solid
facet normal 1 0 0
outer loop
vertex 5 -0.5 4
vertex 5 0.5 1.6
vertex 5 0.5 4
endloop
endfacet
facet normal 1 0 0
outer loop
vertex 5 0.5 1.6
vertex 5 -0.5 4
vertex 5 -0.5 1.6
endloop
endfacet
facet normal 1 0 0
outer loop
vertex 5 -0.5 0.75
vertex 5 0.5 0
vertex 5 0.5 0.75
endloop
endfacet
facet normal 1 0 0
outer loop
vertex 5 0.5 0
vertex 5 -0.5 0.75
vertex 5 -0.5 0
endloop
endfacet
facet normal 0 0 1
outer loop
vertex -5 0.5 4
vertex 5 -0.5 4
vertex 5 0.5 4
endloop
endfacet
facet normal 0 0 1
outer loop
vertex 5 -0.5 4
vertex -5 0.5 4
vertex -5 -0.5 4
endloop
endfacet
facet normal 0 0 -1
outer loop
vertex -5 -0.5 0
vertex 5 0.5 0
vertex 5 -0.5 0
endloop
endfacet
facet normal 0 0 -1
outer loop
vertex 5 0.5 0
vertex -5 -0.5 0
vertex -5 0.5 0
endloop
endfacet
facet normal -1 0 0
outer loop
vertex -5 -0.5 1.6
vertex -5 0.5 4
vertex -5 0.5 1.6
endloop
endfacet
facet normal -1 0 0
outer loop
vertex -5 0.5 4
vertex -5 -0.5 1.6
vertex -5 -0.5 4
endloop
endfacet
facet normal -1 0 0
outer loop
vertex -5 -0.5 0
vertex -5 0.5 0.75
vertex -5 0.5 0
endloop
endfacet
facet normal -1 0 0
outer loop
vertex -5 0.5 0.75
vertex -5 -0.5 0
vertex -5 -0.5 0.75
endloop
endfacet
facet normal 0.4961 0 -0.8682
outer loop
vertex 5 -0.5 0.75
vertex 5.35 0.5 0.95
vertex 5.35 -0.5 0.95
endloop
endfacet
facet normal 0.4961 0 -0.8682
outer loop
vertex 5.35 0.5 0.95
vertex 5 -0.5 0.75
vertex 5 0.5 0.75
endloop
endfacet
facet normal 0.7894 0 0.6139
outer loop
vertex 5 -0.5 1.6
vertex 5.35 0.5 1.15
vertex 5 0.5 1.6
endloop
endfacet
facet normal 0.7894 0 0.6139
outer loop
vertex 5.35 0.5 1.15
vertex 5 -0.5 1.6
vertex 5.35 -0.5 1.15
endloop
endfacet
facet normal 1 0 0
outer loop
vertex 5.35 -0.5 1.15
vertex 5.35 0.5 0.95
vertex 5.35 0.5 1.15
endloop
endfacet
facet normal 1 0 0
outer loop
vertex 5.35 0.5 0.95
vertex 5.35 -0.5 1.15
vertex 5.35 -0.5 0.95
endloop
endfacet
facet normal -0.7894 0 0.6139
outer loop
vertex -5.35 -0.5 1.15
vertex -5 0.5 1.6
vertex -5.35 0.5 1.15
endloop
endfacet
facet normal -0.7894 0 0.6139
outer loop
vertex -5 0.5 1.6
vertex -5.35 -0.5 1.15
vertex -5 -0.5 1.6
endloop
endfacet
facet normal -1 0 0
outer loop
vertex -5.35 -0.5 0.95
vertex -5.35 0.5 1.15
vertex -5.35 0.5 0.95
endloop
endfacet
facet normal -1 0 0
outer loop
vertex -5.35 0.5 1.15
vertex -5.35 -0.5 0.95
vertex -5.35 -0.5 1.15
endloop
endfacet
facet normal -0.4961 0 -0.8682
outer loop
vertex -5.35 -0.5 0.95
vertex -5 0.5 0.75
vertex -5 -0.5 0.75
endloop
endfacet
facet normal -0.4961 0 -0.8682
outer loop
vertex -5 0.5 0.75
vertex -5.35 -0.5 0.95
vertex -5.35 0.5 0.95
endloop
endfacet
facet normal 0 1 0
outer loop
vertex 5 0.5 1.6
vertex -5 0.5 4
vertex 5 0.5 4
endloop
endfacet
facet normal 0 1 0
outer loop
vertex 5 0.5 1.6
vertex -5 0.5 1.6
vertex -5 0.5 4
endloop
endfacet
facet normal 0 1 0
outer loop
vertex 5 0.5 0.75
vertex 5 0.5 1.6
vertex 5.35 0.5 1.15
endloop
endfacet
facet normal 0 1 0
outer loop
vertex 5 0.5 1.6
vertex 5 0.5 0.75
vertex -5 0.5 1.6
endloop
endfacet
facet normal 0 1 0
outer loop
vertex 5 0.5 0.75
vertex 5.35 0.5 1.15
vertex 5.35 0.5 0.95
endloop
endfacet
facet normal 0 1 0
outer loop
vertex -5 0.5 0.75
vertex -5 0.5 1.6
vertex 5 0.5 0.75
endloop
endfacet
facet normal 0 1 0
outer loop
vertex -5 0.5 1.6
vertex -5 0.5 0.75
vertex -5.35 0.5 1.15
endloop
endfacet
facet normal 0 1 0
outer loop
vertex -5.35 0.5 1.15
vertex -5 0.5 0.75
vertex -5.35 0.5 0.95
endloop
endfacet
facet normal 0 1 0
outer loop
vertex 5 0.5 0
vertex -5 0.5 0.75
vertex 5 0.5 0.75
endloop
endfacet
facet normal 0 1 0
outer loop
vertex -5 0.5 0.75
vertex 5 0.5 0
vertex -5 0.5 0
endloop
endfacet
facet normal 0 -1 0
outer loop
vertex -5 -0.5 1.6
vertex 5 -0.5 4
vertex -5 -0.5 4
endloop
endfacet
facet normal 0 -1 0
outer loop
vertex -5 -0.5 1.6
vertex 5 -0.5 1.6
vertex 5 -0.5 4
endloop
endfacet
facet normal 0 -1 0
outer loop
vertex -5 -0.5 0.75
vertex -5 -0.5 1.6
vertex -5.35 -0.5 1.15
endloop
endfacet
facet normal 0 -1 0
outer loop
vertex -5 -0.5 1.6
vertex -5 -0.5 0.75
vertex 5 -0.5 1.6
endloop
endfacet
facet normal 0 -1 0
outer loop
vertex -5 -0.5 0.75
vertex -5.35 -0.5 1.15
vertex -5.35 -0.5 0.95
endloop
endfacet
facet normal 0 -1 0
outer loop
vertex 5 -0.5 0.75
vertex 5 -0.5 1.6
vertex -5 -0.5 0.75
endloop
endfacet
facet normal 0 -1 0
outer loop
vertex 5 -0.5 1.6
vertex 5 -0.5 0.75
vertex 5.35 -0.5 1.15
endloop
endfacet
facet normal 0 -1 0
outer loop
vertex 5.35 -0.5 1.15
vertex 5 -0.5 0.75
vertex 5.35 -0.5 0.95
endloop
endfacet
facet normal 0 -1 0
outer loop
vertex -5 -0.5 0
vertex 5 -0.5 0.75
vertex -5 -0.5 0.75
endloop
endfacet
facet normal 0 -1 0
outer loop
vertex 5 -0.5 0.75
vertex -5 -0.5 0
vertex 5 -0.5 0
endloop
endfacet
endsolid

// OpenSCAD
// file: ../lib/at01_inverted_core_snap.scad
// File: at01_inverted_core_snap.scad
// AT-01 — experiment-owned inverted fixed-core / removable-shell snap.
//
// This geometry does not copy the QuackWorks/OpenGrid snap. It keeps only the
// high-level design lessons: compact fixed side, removable compliant side,
// explicit locating/retention roles, and a Lite-like 4.0 / 3.4 mm Z baseline.

// Fixed-side baseline.
AT01_CORE_SIZE = 10.0;
AT01_CORE_HEIGHT = 4.0;
AT01_ROOT_SHOULDER = 0.6;
AT01_ENGAGEMENT_HEIGHT = 3.4;

// Removable shell.
AT01_CLEARANCE = 0.20;              // per side on nominal 10 x 10 core
AT01_SHELL_WALL = 1.20;
AT01_SHELL_TOP = 1.20;
AT01_SHELL_INNER = AT01_CORE_SIZE + 2 * AT01_CLEARANCE;
AT01_SHELL_OUTER = AT01_SHELL_INNER + 2 * AT01_SHELL_WALL;
AT01_SHELL_HEIGHT = AT01_ENGAGEMENT_HEIGHT + AT01_SHELL_TOP;

// Two-sided retention on +/-X.
AT01_RIB_PROTRUSION = 0.35;
AT01_RIB_WIDTH = 4.0;
AT01_RIB_Z_BOTTOM = 0.75;
AT01_RIB_Z_LOWER_MAX = 0.95;
AT01_RIB_Z_UPPER_MAX = 1.15;
AT01_RIB_Z_TOP = 1.60;

// Receiving window in each compliant shell tongue.
// Values are shell-local; assembled shell starts at Z=AT01_ROOT_SHOULDER.
AT01_WINDOW_WIDTH = 4.8;
AT01_WINDOW_Z_MIN = 0.05;
AT01_WINDOW_Z_MAX = 1.10;

// Two relief slots isolate the center tongue on each +/-X wall.
AT01_FLEX_SLOT_Y = 3.0;
AT01_FLEX_SLOT_WIDTH = 0.8;

// Evidence helpers.
AT01_EXPLODED_Z = 8.0;
AT01_PROFILE_SLICE = 1.0;

assert(
    abs(AT01_ROOT_SHOULDER + AT01_ENGAGEMENT_HEIGHT - AT01_CORE_HEIGHT) < 0.0001,
    "AT-01 Lite baseline must satisfy shoulder + engagement = 4.0 mm."
);
assert(
    abs(AT01_SHELL_INNER - (AT01_CORE_SIZE + 2 * AT01_CLEARANCE)) < 0.0001,
    "AT-01 shell inner size must preserve the stated side clearance."
);

module _at01_positive_x_retention_rib() {
    // Polygon is defined in X/Z and extruded along Y.
    rotate([90, 0, 0])
        linear_extrude(height = AT01_RIB_WIDTH, center = true, convexity = 10)
            polygon(points = [
                [AT01_CORE_SIZE / 2, AT01_RIB_Z_BOTTOM],
                [AT01_CORE_SIZE / 2 + AT01_RIB_PROTRUSION, AT01_RIB_Z_LOWER_MAX],
                [AT01_CORE_SIZE / 2 + AT01_RIB_PROTRUSION, AT01_RIB_Z_UPPER_MAX],
                [AT01_CORE_SIZE / 2, AT01_RIB_Z_TOP]
            ]);
}

module at01_fixed_core() {
    union() {
        translate([-AT01_CORE_SIZE / 2, -AT01_CORE_SIZE / 2, 0])
            cube([AT01_CORE_SIZE, AT01_CORE_SIZE, AT01_CORE_HEIGHT]);

        _at01_positive_x_retention_rib();

        mirror([1, 0, 0])
            _at01_positive_x_retention_rib();
    }
}

module _at01_shell_outer() {
    translate([-AT01_SHELL_OUTER / 2, -AT01_SHELL_OUTER / 2, 0])
        cube([AT01_SHELL_OUTER, AT01_SHELL_OUTER, AT01_SHELL_HEIGHT]);
}

module _at01_shell_cavity() {
    // Ends exactly at the underside of the top plate.
    translate([-AT01_SHELL_INNER / 2, -AT01_SHELL_INNER / 2, -0.05])
        cube([AT01_SHELL_INNER, AT01_SHELL_INNER, AT01_ENGAGEMENT_HEIGHT + 0.05]);
}

module _at01_retention_window(x_sign = 1) {
    wall_center = (AT01_SHELL_INNER / 2 + AT01_SHELL_OUTER / 2) / 2;
    translate([
        x_sign * wall_center,
        0,
        (AT01_WINDOW_Z_MIN + AT01_WINDOW_Z_MAX) / 2
    ])
        cube([
            AT01_SHELL_WALL + 0.4,
            AT01_WINDOW_WIDTH,
            AT01_WINDOW_Z_MAX - AT01_WINDOW_Z_MIN
        ], center = true);
}

module _at01_flex_slot(x_sign = 1, y_sign = 1) {
    wall_center = (AT01_SHELL_INNER / 2 + AT01_SHELL_OUTER / 2) / 2;
    translate([
        x_sign * wall_center,
        y_sign * AT01_FLEX_SLOT_Y,
        AT01_ENGAGEMENT_HEIGHT / 2
    ])
        cube([
            AT01_SHELL_WALL + 0.4,
            AT01_FLEX_SLOT_WIDTH,
            AT01_ENGAGEMENT_HEIGHT + 0.10
        ], center = true);
}

module at01_removable_shell() {
    difference() {
        _at01_shell_outer();
        _at01_shell_cavity();

        for (x_sign = [-1, 1]) {
            _at01_retention_window(x_sign);

            for (y_sign = [-1, 1])
                _at01_flex_slot(x_sign, y_sign);
        }
    }
}

module at01_assembled(shell_alpha = 0.55) {
    color([0.68, 0.70, 0.74])
        at01_fixed_core();

    translate([0, 0, AT01_ROOT_SHOULDER])
        color([0.92, 0.30, 0.12, shell_alpha])
            at01_removable_shell();
}

module at01_exploded() {
    color([0.68, 0.70, 0.74])
        at01_fixed_core();

    translate([0, 0, AT01_ROOT_SHOULDER + AT01_EXPLODED_Z])
        color([0.92, 0.30, 0.12])
            at01_removable_shell();
}

module _at01_retention_slice_volume() {
    translate([-20, -AT01_PROFILE_SLICE / 2, -1])
        cube([40, AT01_PROFILE_SLICE, 12]);
}

module _at01_locating_slice_volume() {
    translate([-AT01_PROFILE_SLICE / 2, -20, -1])
        cube([AT01_PROFILE_SLICE, 40, 12]);
}

module at01_fixed_retention_profile() {
    intersection() {
        at01_fixed_core();
        _at01_retention_slice_volume();
    }
}

module at01_shell_retention_profile() {
    intersection() {
        at01_removable_shell();
        translate([0, 0, -AT01_ROOT_SHOULDER])
            _at01_retention_slice_volume();
    }
}

module at01_fixed_locating_profile() {
    intersection() {
        at01_fixed_core();
        _at01_locating_slice_volume();
    }
}

module at01_shell_locating_profile() {
    intersection() {
        at01_removable_shell();
        translate([0, 0, -AT01_ROOT_SHOULDER])
            _at01_locating_slice_volume();
    }
}

module at01_retention_section() {
    color([0.68, 0.70, 0.74])
        at01_fixed_retention_profile();

    translate([0, 0, AT01_ROOT_SHOULDER])
        color([0.92, 0.30, 0.12])
            at01_shell_retention_profile();
}

module at01_locating_section() {
    color([0.68, 0.70, 0.74])
        at01_fixed_locating_profile();

    translate([0, 0, AT01_ROOT_SHOULDER])
        color([0.92, 0.30, 0.12])
            at01_shell_locating_profile();
}
// main file
include <../lib/at01_inverted_core_snap.scad>
at01_fixed_retention_profile();
